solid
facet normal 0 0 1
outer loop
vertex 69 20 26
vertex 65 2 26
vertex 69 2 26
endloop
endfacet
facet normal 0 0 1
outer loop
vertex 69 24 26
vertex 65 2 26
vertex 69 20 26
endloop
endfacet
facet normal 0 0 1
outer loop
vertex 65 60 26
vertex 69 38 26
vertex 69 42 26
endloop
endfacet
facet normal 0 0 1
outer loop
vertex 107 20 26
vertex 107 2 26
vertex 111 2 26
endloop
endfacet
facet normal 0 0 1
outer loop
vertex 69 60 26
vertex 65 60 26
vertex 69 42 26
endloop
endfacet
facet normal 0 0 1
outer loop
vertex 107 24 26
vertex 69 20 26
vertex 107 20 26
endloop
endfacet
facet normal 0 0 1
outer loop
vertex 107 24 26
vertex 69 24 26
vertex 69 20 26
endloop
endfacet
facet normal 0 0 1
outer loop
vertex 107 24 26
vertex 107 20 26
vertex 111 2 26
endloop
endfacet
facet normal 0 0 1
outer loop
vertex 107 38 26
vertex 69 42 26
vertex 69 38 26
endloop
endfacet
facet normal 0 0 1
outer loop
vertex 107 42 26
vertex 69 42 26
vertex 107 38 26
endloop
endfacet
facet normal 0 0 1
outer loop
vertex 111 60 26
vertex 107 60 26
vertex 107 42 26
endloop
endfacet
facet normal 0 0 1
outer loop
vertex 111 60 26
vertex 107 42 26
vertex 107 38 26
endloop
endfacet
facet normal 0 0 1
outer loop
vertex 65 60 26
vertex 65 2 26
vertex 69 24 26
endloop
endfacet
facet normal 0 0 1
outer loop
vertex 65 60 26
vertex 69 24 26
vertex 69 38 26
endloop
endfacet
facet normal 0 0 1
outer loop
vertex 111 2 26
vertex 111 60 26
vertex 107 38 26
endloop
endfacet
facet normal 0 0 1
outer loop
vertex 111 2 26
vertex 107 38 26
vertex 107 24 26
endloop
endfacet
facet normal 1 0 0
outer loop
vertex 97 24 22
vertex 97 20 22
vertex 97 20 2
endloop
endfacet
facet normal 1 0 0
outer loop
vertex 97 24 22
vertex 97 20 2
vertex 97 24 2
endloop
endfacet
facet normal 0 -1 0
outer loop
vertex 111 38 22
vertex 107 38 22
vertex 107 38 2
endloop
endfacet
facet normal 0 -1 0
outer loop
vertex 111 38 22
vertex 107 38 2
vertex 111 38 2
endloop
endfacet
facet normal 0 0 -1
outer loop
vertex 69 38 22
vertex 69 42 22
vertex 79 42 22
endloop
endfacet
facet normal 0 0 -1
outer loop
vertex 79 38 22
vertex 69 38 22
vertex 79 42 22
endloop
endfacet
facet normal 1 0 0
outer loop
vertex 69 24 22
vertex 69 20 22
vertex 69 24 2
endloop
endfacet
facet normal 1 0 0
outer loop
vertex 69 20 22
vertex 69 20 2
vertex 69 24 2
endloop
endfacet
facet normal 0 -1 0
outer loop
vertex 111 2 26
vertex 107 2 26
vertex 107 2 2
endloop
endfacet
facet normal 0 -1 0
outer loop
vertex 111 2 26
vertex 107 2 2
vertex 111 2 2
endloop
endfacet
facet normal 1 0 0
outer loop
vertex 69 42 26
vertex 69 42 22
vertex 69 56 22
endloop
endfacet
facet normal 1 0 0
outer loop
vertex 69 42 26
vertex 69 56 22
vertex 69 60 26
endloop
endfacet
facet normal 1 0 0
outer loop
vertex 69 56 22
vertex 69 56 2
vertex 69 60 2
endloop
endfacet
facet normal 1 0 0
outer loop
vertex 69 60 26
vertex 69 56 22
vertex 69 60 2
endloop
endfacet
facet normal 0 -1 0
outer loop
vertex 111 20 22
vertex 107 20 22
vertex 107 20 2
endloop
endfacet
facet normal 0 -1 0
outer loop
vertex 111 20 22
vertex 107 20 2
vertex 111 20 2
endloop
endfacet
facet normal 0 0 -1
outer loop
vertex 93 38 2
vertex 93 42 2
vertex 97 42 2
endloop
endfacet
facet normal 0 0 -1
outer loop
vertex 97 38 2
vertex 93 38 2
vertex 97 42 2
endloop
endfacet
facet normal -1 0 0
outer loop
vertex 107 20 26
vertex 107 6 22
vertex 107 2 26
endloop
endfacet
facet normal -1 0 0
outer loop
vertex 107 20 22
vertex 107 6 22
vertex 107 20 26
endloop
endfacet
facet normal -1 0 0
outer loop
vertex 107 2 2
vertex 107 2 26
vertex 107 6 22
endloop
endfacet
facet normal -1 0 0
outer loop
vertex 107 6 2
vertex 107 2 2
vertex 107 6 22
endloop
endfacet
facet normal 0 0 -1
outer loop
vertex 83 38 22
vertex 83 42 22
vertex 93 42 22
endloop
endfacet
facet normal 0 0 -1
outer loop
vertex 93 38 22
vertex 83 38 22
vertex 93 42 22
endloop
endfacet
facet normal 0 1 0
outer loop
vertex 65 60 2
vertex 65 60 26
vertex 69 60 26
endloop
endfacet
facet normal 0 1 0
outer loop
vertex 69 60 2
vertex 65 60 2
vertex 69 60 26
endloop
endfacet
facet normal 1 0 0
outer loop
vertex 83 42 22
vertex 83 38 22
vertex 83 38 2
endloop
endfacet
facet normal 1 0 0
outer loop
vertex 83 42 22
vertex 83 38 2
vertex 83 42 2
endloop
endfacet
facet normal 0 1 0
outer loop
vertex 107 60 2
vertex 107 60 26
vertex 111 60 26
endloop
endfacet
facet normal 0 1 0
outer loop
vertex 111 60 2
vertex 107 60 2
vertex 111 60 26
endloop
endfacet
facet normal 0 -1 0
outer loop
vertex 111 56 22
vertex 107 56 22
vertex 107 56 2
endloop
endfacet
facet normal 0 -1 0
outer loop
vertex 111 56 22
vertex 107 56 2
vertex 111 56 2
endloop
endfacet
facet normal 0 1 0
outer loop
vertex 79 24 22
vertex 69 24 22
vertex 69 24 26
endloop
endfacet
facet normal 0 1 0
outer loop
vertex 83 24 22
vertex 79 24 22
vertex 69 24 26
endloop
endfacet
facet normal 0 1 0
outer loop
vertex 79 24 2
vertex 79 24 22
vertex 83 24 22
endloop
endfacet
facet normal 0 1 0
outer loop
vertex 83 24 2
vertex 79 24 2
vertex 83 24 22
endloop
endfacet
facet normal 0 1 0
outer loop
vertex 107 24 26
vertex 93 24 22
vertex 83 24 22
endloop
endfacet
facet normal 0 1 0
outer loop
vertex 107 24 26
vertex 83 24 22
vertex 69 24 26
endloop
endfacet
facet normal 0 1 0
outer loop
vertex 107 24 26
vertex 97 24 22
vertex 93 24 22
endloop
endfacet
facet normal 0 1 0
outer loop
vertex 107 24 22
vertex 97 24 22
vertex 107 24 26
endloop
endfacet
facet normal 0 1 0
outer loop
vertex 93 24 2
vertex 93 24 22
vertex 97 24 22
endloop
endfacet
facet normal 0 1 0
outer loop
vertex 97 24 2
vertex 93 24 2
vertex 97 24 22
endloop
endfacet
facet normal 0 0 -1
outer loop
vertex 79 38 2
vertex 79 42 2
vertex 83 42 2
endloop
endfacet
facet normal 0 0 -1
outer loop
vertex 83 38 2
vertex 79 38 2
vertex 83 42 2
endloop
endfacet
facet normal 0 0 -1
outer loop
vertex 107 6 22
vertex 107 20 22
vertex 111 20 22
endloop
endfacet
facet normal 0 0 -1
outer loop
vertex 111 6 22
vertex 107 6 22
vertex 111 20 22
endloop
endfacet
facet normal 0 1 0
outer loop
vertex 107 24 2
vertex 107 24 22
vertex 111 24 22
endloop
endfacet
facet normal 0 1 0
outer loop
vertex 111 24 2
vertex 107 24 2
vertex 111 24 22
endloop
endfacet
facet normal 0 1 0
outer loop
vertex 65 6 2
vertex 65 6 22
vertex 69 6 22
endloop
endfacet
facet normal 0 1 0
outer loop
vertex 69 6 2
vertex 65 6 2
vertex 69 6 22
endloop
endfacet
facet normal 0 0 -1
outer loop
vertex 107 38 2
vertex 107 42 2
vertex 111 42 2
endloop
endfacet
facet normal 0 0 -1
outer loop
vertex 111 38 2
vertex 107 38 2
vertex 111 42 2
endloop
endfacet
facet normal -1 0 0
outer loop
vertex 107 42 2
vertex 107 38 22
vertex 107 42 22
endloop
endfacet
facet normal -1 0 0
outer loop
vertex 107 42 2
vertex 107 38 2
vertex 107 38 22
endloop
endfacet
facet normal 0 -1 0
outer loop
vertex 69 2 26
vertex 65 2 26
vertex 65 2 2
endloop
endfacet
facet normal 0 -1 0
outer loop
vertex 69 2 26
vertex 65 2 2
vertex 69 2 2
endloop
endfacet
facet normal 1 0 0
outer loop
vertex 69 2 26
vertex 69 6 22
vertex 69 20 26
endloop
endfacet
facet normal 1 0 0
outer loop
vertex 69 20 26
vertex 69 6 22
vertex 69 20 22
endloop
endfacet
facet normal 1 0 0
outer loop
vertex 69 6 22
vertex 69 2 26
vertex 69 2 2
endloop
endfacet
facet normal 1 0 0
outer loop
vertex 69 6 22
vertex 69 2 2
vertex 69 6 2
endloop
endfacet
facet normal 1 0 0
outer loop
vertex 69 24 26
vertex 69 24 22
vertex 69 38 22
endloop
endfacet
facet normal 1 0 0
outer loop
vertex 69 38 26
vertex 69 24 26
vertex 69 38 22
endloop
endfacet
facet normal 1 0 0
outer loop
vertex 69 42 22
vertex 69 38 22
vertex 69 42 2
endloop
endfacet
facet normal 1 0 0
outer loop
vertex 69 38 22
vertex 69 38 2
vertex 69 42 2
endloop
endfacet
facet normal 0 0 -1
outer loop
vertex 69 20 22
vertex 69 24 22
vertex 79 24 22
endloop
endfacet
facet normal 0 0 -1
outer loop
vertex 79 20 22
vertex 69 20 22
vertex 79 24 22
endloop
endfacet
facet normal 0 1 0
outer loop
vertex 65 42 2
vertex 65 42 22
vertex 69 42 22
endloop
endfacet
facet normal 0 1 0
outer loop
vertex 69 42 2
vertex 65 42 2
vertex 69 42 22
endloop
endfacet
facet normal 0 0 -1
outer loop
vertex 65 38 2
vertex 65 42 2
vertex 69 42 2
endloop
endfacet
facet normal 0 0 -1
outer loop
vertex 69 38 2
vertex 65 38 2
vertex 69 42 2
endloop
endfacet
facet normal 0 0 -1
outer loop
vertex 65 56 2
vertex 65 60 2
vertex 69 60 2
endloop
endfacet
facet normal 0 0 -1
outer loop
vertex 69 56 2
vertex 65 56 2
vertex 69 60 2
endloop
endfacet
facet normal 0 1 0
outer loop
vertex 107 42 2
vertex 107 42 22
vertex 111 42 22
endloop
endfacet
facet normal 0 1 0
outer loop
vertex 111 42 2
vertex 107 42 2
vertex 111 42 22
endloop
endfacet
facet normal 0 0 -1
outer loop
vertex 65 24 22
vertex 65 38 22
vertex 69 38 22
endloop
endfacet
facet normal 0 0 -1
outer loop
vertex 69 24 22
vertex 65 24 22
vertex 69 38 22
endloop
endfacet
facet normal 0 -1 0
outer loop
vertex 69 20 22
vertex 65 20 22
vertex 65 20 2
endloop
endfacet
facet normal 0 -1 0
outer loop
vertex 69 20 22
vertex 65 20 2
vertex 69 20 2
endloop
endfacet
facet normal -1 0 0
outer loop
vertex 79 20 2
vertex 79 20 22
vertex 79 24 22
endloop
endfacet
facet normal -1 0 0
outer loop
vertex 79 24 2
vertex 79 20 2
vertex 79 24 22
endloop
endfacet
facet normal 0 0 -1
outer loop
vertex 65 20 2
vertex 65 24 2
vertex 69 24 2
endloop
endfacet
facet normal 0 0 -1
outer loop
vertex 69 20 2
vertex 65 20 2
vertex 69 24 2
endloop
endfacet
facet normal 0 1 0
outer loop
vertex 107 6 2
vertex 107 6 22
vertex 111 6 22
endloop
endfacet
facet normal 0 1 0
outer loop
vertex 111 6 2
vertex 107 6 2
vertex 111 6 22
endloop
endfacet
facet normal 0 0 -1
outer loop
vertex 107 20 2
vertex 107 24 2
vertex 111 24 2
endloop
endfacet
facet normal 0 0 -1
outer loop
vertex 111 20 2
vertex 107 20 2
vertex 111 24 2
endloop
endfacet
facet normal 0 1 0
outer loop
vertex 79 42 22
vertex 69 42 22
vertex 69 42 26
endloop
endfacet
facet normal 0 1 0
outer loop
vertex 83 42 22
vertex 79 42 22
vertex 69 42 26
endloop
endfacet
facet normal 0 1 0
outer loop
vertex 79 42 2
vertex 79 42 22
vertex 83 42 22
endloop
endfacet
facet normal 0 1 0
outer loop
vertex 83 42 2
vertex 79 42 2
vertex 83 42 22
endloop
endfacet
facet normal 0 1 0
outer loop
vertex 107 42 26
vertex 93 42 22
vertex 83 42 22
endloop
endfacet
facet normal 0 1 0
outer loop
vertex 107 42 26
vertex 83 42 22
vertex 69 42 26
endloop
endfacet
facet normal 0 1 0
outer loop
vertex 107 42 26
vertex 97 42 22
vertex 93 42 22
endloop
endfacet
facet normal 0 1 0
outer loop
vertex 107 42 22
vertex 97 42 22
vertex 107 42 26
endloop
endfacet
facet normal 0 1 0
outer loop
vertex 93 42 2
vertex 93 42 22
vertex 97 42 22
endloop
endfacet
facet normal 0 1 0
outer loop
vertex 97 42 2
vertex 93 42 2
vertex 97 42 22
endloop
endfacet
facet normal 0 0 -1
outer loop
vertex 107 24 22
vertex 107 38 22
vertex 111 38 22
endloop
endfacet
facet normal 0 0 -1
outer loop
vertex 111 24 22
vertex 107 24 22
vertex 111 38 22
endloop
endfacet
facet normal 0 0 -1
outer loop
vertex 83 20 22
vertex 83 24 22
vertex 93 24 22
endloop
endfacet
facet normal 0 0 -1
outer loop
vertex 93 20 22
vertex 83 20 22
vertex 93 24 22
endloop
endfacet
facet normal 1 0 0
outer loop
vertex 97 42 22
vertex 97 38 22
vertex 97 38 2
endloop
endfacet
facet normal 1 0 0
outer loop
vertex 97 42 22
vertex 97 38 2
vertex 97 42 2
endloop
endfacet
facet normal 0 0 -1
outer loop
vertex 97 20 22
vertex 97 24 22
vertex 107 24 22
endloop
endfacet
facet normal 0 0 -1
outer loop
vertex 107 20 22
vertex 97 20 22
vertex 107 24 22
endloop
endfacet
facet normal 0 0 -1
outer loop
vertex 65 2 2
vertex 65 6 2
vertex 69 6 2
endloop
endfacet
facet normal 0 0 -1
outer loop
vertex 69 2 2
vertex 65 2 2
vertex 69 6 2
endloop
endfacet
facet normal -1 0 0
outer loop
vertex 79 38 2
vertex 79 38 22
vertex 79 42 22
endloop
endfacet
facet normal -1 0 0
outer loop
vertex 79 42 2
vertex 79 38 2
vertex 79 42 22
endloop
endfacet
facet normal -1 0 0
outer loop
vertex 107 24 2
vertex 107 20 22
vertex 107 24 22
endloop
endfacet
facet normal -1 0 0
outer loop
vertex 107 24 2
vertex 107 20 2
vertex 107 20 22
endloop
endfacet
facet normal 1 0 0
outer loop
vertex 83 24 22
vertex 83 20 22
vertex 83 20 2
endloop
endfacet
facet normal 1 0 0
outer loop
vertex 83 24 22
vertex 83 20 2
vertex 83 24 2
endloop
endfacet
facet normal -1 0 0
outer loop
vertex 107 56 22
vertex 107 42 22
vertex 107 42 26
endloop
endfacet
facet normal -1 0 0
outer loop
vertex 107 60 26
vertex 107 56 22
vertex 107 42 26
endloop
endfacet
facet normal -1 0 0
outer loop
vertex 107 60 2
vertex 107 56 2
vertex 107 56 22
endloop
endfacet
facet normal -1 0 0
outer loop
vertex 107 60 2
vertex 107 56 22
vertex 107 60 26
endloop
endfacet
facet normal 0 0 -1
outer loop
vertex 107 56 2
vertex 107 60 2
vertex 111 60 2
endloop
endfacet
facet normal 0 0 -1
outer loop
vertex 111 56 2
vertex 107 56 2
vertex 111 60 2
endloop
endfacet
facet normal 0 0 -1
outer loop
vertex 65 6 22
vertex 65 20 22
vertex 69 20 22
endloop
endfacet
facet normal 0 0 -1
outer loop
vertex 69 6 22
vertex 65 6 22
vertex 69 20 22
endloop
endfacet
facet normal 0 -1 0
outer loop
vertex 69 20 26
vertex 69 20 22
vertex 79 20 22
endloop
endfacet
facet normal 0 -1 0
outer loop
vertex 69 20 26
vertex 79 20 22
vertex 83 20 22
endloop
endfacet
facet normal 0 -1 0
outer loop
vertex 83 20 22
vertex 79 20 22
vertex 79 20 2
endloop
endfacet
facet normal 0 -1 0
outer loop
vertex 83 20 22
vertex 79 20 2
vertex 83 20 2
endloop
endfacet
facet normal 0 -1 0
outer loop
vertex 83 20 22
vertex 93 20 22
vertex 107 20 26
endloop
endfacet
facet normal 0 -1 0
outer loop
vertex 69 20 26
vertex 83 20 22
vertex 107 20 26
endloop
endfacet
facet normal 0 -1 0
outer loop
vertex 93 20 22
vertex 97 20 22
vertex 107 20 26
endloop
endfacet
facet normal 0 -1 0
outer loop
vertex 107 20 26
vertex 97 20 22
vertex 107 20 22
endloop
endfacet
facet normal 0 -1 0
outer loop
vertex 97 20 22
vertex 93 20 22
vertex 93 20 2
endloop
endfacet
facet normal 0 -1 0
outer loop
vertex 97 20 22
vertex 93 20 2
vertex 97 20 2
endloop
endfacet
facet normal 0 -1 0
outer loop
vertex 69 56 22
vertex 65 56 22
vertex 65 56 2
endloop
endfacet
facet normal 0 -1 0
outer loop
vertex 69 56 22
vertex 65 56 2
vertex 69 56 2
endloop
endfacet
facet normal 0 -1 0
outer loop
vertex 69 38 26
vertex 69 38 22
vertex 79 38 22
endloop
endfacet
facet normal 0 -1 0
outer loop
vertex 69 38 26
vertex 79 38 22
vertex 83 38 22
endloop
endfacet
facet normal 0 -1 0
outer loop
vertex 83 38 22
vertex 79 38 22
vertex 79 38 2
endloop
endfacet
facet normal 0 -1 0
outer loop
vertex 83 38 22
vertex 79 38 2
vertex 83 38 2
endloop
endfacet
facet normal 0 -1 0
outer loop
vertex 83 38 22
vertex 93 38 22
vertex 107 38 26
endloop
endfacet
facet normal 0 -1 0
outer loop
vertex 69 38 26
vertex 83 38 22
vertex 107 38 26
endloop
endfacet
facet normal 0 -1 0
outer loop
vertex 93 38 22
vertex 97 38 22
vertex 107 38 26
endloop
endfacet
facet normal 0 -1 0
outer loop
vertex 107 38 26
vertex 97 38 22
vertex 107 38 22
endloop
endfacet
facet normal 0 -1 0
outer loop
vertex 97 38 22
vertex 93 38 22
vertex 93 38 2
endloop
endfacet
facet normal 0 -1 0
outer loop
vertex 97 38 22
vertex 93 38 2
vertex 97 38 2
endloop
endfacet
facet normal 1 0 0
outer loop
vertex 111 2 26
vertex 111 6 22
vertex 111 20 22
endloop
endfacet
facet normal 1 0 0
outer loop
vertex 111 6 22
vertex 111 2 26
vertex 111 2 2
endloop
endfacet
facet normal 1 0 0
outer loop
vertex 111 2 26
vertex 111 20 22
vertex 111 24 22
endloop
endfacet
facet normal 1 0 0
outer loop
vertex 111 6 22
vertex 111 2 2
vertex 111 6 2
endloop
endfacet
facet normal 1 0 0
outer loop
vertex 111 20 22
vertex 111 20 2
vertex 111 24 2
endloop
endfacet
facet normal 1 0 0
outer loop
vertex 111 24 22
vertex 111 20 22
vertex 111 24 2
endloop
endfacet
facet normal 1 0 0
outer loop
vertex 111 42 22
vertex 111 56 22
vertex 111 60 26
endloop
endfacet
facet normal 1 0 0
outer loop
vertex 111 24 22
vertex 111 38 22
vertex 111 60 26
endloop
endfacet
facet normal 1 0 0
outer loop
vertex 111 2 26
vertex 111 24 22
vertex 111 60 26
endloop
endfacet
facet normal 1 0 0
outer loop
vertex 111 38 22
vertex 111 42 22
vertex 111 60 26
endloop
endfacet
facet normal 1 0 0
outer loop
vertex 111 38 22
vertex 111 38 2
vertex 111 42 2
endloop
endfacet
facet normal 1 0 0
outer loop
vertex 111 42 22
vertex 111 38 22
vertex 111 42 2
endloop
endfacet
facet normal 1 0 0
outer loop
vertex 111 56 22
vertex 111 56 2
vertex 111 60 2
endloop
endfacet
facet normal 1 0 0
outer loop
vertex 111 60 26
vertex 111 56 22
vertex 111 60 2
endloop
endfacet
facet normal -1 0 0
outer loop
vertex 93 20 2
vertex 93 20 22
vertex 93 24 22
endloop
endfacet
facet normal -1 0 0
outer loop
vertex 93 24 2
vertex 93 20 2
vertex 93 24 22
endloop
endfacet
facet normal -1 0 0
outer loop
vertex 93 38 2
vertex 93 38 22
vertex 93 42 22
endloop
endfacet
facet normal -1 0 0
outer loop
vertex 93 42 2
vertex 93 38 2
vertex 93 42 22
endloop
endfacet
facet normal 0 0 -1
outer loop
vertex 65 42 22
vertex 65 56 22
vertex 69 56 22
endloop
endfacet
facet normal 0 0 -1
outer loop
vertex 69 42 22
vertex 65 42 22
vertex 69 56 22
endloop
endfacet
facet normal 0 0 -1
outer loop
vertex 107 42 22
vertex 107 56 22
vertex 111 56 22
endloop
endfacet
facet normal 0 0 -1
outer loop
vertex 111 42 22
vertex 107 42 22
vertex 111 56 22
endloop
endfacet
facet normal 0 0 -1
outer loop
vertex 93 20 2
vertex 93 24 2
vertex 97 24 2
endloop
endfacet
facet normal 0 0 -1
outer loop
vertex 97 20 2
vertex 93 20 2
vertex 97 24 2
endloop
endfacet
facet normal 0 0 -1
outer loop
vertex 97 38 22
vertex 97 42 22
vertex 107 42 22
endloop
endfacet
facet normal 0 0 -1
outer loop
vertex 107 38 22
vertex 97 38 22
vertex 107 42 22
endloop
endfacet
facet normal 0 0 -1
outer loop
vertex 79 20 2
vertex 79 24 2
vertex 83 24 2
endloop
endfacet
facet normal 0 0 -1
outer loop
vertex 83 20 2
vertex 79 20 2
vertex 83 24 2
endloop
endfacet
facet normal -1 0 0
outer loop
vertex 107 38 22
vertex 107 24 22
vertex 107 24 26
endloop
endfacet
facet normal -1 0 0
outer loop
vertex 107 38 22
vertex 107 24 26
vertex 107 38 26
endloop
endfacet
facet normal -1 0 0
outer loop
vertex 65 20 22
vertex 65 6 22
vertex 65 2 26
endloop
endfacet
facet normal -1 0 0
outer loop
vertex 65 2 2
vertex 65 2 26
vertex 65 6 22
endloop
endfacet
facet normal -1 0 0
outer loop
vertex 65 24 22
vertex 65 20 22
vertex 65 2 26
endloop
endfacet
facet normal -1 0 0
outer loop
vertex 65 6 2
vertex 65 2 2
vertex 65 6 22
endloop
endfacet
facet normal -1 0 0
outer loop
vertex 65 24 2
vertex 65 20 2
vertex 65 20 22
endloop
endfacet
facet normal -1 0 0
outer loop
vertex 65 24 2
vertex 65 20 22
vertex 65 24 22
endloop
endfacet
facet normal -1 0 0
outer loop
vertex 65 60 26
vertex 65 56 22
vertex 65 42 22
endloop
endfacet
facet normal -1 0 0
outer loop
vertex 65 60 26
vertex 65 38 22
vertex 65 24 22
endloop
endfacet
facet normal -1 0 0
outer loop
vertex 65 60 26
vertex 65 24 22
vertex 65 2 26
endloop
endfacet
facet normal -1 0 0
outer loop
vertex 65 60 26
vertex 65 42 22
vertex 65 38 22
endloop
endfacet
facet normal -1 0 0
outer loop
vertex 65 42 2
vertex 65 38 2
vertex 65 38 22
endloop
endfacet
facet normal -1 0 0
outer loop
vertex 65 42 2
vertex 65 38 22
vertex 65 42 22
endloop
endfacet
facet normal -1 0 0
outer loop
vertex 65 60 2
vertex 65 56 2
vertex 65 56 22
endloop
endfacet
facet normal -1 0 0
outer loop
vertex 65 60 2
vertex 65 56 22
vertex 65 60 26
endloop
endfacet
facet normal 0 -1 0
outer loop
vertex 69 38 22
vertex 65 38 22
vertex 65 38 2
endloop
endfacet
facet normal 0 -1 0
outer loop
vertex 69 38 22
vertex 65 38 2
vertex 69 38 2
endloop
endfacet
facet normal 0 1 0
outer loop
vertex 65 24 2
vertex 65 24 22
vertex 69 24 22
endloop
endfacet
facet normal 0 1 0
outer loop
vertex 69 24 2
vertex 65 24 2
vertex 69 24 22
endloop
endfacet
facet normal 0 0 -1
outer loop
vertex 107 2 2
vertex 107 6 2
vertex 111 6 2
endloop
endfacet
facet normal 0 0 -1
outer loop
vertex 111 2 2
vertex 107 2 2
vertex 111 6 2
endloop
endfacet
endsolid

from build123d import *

# Parameters (mm, degrees)
BOX085056_W     = 4
BOX085056_H     = 58
BOX085056_DEPTH = 4
BOX085057_W     = 4
BOX085057_H     = 4
BOX085057_DEPTH = 20
BOX085058_W     = 4
BOX085058_H     = 4
BOX085058_DEPTH = 20
BOX085059_W     = 4
BOX085059_H     = 4
BOX085059_DEPTH = 20
BOX085060_W     = 4
BOX085060_H     = 4
BOX085060_DEPTH = 20
BOX085061_W     = 4
BOX085061_H     = 4
BOX085061_DEPTH = 20
BOX085062_W     = 4
BOX085062_H     = 4
BOX085062_DEPTH = 20
BOX085063_W     = 4
BOX085063_H     = 4
BOX085063_DEPTH = 20
BOX085064_W     = 4
BOX085064_H     = 4
BOX085064_DEPTH = 20
BOX085065_W     = 38
BOX085065_H     = 4
BOX085065_DEPTH = 4
BOX085066_W     = 38
BOX085066_H     = 4
BOX085066_DEPTH = 4
BOX085067_W     = 4
BOX085067_H     = 4
BOX085067_DEPTH = 20
BOX085068_W     = 4
BOX085068_H     = 4
BOX085068_DEPTH = 20
BOX085069_W     = 4
BOX085069_H     = 4
BOX085069_DEPTH = 20
BOX085070_W     = 4
BOX085070_H     = 4
BOX085070_DEPTH = 20
BOX085055_W     = 4
BOX085055_H     = 58
BOX085055_DEPTH = 4


with BuildPart() as cube142:
    # Box085056 → Box085056 (new body)
    with BuildSketch(Plane(origin=(107, 2, 22), x_dir=(1, 0, 0), z_dir=(0, 0, 1))):
        with Locations((2, 29)):
            Rectangle(BOX085056_W, BOX085056_H)
    extrude(amount=BOX085056_DEPTH)


with BuildPart() as cube143:
    # Box085057 → Box085057 (new body)
    with BuildSketch(Plane(origin=(65, 38, 2), x_dir=(1, 0, 0), z_dir=(0, 0, 1))):
        with Locations((2, 2)):
            Rectangle(BOX085057_W, BOX085057_H)
    extrude(amount=BOX085057_DEPTH)


with BuildPart() as cube144:
    # Box085058 → Box085058 (new body)
    with BuildSketch(Plane(origin=(65, 2, 2), x_dir=(1, 0, 0), z_dir=(0, 0, 1))):
        with Locations((2, 2)):
            Rectangle(BOX085058_W, BOX085058_H)
    extrude(amount=BOX085058_DEPTH)


with BuildPart() as cube145:
    # Box085059 → Box085059 (new body)
    with BuildSketch(Plane(origin=(65, 56, 2), x_dir=(1, 0, 0), z_dir=(0, 0, 1))):
        with Locations((2, 2)):
            Rectangle(BOX085059_W, BOX085059_H)
    extrude(amount=BOX085059_DEPTH)


with BuildPart() as cube146:
    # Box085060 → Box085060 (new body)
    with BuildSketch(Plane(origin=(107, 38, 2), x_dir=(1, 0, 0), z_dir=(0, 0, 1))):
        with Locations((2, 2)):
            Rectangle(BOX085060_W, BOX085060_H)
    extrude(amount=BOX085060_DEPTH)


with BuildPart() as cube147:
    # Box085061 → Box085061 (new body)
    with BuildSketch(Plane(origin=(107, 2, 2), x_dir=(1, 0, 0), z_dir=(0, 0, 1))):
        with Locations((2, 2)):
            Rectangle(BOX085061_W, BOX085061_H)
    extrude(amount=BOX085061_DEPTH)


with BuildPart() as cube148:
    # Box085062 → Box085062 (new body)
    with BuildSketch(Plane(origin=(107, 56, 2), x_dir=(1, 0, 0), z_dir=(0, 0, 1))):
        with Locations((2, 2)):
            Rectangle(BOX085062_W, BOX085062_H)
    extrude(amount=BOX085062_DEPTH)


with BuildPart() as cube149:
    # Box085063 → Box085063 (new body)
    with BuildSketch(Plane(origin=(65, 20, 2), x_dir=(1, 0, 0), z_dir=(0, 0, 1))):
        with Locations((2, 2)):
            Rectangle(BOX085063_W, BOX085063_H)
    extrude(amount=BOX085063_DEPTH)


with BuildPart() as cube150:
    # Box085064 → Box085064 (new body)
    with BuildSketch(Plane(origin=(107, 20, 2), x_dir=(1, 0, 0), z_dir=(0, 0, 1))):
        with Locations((2, 2)):
            Rectangle(BOX085064_W, BOX085064_H)
    extrude(amount=BOX085064_DEPTH)


with BuildPart() as cube151:
    # Box085065 → Box085065 (new body)
    with BuildSketch(Plane(origin=(69, 20, 22), x_dir=(1, 0, 0), z_dir=(0, 0, 1))):
        with Locations((19, 2)):
            Rectangle(BOX085065_W, BOX085065_H)
    extrude(amount=BOX085065_DEPTH)


with BuildPart() as cube152:
    # Box085066 → Box085066 (new body)
    with BuildSketch(Plane(origin=(69, 38, 22), x_dir=(1, 0, 0), z_dir=(0, 0, 1))):
        with Locations((19, 2)):
            Rectangle(BOX085066_W, BOX085066_H)
    extrude(amount=BOX085066_DEPTH)


with BuildPart() as cube153:
    # Box085067 → Box085067 (new body)
    with BuildSketch(Plane(origin=(79, 20, 2), x_dir=(1, 0, 0), z_dir=(0, 0, 1))):
        with Locations((2, 2)):
            Rectangle(BOX085067_W, BOX085067_H)
    extrude(amount=BOX085067_DEPTH)


with BuildPart() as cube154:
    # Box085068 → Box085068 (new body)
    with BuildSketch(Plane(origin=(93, 20, 2), x_dir=(1, 0, 0), z_dir=(0, 0, 1))):
        with Locations((2, 2)):
            Rectangle(BOX085068_W, BOX085068_H)
    extrude(amount=BOX085068_DEPTH)


with BuildPart() as cube155:
    # Box085069 → Box085069 (new body)
    with BuildSketch(Plane(origin=(79, 38, 2), x_dir=(1, 0, 0), z_dir=(0, 0, 1))):
        with Locations((2, 2)):
            Rectangle(BOX085069_W, BOX085069_H)
    extrude(amount=BOX085069_DEPTH)


with BuildPart() as cube156:
    # Box085070 → Box085070 (new body)
    with BuildSketch(Plane(origin=(93, 38, 2), x_dir=(1, 0, 0), z_dir=(0, 0, 1))):
        with Locations((2, 2)):
            Rectangle(BOX085070_W, BOX085070_H)
    extrude(amount=BOX085070_DEPTH)


with BuildPart() as drawer_rails:
    # Box085055 → Box085055 (new body)
    with BuildSketch(Plane(origin=(65, 2, 22), x_dir=(1, 0, 0), z_dir=(0, 0, 1))):
        with Locations((2, 29)):
            Rectangle(BOX085055_W, BOX085055_H)
    extrude(amount=BOX085055_DEPTH)

    # Fusion004008002002002001007002002018: union Cube142, Cube143, Cube144, Cube145, Cube146, Cube147, Cube148, Cube149, Cube150, Cube151, Cube152, Cube153, Cube154, Cube155, Cube156
    add(cube142.part)
    add(cube143.part)
    add(cube144.part)
    add(cube145.part)
    add(cube146.part)
    add(cube147.part)
    add(cube148.part)
    add(cube149.part)
    add(cube150.part)
    add(cube151.part)
    add(cube152.part)
    add(cube153.part)
    add(cube154.part)
    add(cube155.part)
    add(cube156.part)


solid = drawer_rails.part
